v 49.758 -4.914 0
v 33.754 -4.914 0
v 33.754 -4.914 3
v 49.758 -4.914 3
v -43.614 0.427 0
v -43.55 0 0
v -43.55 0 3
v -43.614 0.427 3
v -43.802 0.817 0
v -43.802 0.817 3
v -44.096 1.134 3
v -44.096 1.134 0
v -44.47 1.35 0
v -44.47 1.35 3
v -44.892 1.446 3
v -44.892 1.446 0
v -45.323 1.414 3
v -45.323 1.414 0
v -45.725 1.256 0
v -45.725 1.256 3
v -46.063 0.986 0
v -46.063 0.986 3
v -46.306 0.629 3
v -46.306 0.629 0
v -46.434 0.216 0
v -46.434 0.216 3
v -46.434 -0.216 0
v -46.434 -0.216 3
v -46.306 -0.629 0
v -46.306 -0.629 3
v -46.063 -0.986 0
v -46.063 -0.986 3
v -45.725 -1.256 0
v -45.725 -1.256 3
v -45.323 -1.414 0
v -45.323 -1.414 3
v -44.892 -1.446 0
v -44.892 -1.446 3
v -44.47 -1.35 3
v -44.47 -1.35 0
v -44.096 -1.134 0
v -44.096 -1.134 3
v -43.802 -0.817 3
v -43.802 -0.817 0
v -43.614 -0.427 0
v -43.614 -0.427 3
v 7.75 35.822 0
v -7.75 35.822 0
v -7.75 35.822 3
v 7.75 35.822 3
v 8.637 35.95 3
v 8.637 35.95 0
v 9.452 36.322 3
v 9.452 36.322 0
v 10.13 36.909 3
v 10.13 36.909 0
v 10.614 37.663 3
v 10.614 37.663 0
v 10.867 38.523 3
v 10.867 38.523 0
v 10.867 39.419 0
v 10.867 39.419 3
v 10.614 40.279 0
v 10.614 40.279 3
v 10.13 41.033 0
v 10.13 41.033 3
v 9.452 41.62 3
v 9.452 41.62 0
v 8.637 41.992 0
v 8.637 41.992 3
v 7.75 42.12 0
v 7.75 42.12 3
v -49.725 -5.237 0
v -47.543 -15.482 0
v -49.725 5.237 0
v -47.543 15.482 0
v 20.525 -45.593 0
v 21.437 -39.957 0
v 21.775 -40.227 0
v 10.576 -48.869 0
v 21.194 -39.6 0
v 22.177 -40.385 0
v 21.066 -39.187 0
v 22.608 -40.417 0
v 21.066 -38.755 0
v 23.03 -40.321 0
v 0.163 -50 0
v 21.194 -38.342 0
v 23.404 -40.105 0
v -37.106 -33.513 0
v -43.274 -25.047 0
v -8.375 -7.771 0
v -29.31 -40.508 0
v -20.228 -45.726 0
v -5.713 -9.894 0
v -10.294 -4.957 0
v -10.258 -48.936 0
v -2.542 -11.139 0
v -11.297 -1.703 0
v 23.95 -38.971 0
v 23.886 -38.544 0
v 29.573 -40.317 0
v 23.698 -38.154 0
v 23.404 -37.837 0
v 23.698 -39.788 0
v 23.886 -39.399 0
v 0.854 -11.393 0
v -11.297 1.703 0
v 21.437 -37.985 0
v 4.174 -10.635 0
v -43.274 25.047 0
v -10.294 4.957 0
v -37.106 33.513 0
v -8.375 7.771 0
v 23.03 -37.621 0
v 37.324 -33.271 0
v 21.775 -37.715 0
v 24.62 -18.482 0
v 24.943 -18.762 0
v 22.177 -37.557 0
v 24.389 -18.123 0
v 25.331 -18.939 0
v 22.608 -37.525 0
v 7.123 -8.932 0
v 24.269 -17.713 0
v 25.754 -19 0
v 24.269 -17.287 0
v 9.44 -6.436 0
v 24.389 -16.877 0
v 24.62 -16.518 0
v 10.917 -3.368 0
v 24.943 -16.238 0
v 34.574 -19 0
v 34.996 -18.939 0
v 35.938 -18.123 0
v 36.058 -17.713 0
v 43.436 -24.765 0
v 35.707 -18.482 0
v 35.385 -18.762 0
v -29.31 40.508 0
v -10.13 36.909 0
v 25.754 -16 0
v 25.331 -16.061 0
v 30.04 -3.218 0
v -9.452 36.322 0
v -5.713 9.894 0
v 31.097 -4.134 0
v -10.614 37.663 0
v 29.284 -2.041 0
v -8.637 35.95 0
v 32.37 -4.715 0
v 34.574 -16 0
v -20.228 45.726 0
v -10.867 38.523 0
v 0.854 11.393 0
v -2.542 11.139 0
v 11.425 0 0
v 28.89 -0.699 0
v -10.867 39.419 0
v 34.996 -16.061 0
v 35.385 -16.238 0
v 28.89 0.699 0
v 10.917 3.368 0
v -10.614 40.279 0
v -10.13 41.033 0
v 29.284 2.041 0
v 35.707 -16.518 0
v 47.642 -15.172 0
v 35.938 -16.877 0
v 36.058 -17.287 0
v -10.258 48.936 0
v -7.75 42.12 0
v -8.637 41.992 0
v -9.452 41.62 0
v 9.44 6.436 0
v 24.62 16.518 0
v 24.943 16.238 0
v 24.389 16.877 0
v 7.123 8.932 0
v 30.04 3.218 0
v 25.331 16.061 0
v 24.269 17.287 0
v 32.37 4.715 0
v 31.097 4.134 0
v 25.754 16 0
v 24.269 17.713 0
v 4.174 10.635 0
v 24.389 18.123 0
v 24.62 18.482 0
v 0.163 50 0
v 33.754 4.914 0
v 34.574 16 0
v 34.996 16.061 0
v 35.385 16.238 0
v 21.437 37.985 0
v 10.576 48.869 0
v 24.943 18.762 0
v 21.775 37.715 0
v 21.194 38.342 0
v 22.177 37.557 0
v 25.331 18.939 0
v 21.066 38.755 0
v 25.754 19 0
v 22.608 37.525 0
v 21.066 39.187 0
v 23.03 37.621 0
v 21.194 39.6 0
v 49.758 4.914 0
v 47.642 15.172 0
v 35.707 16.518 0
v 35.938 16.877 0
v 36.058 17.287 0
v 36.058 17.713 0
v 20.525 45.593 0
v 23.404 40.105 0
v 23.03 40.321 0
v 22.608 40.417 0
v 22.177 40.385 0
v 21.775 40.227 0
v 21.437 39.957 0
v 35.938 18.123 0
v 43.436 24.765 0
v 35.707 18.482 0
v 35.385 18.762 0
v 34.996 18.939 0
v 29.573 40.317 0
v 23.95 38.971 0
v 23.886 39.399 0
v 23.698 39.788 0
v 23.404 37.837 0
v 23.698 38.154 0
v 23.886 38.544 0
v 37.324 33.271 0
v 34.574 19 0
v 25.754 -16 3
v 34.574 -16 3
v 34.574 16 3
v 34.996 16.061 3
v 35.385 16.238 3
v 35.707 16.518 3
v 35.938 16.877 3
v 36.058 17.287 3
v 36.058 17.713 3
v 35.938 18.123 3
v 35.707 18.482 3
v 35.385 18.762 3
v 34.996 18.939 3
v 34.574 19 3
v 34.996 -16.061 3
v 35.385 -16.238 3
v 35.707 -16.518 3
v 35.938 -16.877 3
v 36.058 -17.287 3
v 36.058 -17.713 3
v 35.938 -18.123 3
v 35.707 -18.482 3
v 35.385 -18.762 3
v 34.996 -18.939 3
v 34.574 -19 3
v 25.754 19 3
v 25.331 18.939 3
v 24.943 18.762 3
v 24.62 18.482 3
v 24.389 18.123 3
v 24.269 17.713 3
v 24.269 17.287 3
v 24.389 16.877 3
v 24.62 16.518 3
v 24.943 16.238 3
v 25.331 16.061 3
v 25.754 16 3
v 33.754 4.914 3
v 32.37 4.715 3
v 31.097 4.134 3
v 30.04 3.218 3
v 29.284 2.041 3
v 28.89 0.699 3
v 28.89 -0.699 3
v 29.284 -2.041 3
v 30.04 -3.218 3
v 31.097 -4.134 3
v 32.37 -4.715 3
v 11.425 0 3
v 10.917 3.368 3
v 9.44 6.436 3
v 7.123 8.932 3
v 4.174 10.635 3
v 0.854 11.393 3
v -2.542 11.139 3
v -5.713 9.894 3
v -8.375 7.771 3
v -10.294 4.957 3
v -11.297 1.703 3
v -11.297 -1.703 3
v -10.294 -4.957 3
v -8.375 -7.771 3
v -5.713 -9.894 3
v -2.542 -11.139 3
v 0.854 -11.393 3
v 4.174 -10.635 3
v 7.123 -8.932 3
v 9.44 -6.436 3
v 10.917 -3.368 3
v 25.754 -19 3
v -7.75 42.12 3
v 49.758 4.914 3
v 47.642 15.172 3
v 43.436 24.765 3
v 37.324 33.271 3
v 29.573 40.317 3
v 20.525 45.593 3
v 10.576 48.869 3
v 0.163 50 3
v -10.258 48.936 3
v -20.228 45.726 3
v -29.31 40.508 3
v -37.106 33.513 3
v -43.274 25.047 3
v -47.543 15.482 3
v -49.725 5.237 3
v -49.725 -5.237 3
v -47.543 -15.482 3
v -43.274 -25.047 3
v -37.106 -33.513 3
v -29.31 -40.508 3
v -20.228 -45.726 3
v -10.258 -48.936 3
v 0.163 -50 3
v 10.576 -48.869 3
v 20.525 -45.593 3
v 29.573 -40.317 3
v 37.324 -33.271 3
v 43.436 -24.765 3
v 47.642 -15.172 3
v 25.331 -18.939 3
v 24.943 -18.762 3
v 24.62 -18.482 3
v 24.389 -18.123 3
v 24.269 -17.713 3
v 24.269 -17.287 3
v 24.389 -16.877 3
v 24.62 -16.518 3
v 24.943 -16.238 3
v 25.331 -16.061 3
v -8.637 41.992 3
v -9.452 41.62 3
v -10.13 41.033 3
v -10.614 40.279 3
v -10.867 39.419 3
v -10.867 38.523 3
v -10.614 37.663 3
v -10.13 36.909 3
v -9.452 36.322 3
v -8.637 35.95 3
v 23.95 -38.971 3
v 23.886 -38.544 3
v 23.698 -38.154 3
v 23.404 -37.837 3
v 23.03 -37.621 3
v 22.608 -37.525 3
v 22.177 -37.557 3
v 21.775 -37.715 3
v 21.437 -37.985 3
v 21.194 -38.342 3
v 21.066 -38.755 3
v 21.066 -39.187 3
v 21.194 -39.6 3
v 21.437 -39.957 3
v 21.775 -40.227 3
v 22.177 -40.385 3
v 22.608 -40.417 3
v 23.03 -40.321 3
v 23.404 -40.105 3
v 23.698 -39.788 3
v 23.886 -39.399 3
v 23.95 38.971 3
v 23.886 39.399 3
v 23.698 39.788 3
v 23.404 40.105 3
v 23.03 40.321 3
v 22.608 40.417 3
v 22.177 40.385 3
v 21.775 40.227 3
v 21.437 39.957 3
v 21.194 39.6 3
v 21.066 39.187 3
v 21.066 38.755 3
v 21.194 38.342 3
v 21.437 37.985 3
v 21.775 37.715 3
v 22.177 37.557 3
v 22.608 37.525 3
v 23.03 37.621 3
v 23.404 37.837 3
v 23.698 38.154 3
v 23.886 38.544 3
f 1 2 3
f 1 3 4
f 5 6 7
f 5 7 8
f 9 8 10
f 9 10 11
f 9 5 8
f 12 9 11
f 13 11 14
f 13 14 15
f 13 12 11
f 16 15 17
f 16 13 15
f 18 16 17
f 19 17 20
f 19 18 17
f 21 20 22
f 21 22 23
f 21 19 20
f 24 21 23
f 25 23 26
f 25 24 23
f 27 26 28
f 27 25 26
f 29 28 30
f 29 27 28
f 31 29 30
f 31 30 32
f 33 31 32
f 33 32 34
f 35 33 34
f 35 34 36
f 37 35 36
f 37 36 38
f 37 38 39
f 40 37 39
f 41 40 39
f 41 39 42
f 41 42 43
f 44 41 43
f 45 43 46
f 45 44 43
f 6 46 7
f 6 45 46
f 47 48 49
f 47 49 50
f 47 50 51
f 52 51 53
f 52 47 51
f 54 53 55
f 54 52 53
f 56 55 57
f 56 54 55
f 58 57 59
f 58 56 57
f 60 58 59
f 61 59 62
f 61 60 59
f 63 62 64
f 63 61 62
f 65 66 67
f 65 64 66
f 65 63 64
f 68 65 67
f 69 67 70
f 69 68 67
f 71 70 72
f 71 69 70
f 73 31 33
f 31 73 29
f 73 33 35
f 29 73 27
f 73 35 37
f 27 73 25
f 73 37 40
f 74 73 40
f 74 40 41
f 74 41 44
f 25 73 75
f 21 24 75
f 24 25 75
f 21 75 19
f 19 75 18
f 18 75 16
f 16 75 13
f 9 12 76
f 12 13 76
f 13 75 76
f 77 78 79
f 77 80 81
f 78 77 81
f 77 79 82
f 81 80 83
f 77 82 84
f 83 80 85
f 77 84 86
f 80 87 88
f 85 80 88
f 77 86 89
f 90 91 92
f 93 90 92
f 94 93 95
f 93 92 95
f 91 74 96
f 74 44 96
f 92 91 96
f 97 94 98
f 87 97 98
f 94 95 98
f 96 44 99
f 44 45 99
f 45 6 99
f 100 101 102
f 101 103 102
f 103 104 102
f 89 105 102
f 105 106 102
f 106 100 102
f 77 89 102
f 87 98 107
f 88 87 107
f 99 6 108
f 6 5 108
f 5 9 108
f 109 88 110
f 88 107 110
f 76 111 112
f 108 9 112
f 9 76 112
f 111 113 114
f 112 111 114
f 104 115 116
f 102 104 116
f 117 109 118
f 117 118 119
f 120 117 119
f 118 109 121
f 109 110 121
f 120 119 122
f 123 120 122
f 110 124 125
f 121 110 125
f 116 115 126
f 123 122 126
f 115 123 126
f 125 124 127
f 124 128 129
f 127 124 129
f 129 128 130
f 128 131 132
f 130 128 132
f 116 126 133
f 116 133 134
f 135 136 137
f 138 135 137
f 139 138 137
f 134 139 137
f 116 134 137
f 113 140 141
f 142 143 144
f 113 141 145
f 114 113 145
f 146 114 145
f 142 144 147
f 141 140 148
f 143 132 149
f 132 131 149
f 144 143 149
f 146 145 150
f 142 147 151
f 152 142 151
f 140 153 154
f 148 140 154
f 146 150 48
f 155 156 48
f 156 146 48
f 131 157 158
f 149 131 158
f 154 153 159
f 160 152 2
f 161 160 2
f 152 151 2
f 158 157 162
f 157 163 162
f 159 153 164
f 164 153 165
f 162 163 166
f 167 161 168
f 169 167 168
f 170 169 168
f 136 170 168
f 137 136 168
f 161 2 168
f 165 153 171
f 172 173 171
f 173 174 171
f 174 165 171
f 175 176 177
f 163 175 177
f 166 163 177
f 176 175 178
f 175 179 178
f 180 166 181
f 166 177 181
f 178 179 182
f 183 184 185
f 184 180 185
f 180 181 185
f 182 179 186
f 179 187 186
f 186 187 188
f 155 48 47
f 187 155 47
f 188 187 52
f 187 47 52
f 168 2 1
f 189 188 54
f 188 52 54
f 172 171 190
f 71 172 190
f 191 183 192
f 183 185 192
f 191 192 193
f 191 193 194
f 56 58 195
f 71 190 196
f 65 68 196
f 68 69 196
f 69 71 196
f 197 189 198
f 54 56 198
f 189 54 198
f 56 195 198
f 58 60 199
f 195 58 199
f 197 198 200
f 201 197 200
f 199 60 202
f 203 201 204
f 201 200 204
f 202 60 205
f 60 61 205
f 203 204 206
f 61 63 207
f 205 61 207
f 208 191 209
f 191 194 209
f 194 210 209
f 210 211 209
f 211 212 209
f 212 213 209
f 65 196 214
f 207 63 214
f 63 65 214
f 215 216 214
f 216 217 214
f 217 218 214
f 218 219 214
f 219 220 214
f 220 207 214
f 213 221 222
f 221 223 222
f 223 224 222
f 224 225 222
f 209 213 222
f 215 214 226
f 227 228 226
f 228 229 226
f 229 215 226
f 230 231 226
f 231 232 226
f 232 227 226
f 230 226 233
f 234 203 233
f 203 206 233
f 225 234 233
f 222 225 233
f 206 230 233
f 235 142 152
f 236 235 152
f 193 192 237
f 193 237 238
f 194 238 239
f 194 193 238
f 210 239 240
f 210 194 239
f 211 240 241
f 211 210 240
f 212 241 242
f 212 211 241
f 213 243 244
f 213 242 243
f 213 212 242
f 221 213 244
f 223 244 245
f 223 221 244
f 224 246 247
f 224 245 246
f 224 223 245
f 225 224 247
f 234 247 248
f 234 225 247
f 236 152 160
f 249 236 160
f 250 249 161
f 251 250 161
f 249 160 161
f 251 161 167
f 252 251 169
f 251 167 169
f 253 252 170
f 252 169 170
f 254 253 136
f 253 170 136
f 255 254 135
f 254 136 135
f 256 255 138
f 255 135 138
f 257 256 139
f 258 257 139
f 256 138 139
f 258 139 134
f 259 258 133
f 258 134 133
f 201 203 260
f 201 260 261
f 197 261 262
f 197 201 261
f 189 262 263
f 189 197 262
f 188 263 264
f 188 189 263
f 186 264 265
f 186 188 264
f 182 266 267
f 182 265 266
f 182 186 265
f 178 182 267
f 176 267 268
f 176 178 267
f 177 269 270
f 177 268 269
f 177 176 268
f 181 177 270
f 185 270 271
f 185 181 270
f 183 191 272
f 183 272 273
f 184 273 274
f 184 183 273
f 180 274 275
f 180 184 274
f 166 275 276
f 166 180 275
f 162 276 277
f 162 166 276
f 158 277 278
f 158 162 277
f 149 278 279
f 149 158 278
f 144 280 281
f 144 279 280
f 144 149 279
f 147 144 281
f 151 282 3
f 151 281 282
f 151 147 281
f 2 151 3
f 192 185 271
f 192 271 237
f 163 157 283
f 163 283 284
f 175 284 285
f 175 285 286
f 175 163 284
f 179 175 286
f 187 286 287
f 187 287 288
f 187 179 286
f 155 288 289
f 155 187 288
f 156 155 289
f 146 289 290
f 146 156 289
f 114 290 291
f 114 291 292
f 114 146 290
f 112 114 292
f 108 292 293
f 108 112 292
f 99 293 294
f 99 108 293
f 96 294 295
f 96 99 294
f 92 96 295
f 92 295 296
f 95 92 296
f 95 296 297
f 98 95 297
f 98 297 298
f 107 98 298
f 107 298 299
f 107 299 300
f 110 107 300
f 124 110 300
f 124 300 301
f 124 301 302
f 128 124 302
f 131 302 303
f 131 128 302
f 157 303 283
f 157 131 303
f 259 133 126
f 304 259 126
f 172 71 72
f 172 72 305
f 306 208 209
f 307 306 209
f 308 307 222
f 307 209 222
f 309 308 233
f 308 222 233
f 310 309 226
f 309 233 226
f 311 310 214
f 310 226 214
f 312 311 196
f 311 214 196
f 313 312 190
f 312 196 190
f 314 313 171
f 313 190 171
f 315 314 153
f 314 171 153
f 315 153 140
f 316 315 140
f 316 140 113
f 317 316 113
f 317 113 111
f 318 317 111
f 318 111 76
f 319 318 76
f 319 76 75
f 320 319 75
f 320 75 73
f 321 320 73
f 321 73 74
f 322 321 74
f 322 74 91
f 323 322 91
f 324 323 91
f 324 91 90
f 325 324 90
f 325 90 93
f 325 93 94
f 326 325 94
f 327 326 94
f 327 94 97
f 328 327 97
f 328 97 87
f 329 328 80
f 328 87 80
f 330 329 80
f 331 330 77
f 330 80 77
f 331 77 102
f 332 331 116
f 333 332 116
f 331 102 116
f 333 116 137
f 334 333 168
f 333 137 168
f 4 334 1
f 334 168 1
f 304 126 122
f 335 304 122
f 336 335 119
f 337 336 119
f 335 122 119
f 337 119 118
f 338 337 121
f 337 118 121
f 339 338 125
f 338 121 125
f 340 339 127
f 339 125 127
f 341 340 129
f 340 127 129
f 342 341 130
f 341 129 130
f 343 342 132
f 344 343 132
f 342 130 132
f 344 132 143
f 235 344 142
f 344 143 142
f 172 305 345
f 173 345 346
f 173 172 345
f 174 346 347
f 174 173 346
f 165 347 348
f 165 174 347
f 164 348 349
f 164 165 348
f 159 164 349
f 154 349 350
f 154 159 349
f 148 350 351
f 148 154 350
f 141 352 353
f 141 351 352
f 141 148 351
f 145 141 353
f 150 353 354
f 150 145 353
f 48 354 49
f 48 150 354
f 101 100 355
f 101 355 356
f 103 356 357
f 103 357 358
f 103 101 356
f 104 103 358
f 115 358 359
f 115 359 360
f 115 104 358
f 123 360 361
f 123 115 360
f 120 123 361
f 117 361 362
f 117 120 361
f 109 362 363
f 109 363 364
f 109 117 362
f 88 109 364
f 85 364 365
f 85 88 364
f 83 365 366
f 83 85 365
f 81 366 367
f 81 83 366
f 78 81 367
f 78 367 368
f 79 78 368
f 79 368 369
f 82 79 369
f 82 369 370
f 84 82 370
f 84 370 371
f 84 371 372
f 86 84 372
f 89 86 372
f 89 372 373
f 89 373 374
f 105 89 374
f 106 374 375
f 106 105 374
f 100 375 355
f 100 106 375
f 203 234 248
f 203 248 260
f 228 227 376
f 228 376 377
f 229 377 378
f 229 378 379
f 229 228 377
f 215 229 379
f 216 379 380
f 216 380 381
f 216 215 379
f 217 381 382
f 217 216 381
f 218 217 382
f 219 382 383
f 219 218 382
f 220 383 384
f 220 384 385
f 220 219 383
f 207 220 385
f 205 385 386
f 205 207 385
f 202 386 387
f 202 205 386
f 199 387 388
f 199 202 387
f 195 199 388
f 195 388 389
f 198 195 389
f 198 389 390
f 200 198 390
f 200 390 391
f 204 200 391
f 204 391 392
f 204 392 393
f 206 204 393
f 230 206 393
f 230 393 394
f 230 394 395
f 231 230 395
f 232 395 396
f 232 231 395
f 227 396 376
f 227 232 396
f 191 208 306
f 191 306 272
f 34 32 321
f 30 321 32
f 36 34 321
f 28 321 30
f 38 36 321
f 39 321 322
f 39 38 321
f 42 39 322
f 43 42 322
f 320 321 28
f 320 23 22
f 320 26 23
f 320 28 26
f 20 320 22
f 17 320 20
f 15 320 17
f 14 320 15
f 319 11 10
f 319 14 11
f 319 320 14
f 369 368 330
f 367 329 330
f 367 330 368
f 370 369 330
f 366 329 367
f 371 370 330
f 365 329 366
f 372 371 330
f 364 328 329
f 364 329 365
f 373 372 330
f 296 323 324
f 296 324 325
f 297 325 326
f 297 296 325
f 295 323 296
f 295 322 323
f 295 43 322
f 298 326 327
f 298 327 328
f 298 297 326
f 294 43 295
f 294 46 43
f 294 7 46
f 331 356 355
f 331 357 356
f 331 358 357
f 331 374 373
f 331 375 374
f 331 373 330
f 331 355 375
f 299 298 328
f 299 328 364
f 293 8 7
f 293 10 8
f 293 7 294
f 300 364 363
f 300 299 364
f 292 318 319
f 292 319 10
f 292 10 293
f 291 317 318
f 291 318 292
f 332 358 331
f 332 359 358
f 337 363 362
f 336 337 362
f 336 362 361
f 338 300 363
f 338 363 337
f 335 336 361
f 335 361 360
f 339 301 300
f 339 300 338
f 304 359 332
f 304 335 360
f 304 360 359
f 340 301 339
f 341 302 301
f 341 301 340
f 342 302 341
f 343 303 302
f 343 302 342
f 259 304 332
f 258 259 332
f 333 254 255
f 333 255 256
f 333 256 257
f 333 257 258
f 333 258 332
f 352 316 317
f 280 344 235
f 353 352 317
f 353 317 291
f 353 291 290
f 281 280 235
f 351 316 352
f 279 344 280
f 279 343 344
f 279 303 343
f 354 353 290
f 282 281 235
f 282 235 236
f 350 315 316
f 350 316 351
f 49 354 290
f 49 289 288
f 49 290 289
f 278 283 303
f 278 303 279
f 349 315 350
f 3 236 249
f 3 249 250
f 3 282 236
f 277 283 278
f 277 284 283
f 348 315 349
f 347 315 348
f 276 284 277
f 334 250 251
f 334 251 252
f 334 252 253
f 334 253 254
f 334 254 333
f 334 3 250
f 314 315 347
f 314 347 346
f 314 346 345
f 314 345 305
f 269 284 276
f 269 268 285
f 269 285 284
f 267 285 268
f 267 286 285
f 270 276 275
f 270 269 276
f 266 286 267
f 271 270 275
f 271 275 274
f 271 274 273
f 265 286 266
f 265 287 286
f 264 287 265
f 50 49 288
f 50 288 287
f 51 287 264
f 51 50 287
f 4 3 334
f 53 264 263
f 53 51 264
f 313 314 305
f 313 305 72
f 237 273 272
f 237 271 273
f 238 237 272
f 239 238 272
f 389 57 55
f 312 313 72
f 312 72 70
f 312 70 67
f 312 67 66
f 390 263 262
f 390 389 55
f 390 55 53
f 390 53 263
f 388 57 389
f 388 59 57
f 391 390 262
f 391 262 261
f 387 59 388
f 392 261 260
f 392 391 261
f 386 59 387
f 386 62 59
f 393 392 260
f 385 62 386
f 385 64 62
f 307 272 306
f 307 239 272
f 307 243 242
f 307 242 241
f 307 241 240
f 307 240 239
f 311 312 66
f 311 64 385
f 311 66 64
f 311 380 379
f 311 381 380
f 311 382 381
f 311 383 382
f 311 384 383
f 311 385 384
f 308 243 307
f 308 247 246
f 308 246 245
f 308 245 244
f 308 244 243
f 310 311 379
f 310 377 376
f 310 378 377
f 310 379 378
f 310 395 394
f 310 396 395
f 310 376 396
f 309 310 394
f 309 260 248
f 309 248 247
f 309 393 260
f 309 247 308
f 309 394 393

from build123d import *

# Parameters (mm, degrees)
SKETCH1_R           = 50
SKETCH1_R_2         = 1.45
SKETCH1_R_3         = 11.425
BOSS_EXTRUDE1_DEPTH = 3
CUT_EXTRUDE4_REACH  = 72.774
CUT_EXTRUDE3_DEPTH  = 10


with BuildPart() as part:
    # Sketch1 → Boss-Extrude1 (new body)
    with BuildSketch(Plane.XY):
        Circle(SKETCH1_R)
        with Locations((22.5, -38.97114317)):
            Circle(SKETCH1_R_2, mode=Mode.SUBTRACT)
        with Locations((-45, 0)):
            Circle(SKETCH1_R_2, mode=Mode.SUBTRACT)
        Circle(SKETCH1_R_3, mode=Mode.SUBTRACT)
        with Locations((22.5, 38.97114317)):
            Circle(SKETCH1_R_2, mode=Mode.SUBTRACT)
    extrude(amount=BOSS_EXTRUDE1_DEPTH)

    # Sketch1_6 → Cut-Extrude4 (cut, up to next)
    with BuildSketch(Plane.XY, mode=Mode.PRIVATE) as cut_extrude4_sk1:
        with BuildLine():
            Line((7.75, 42.119988573), (-7.75, 42.119988573))
            ThreePointArc((-7.75, 42.119988573), (-10.898845402, 38.97114317), (-7.75, 35.822297768))
            Line((-7.75, 35.822297768), (7.75, 35.822297768))
            ThreePointArc((7.75, 35.822297768), (10.898845402, 38.97114317), (7.75, 42.119988573))
        make_face()
    cut_extrude4_tool1 = extrude(cut_extrude4_sk1.sketch, amount=CUT_EXTRUDE4_REACH, mode=Mode.PRIVATE) & part.part
    add(cut_extrude4_tool1.solids().sort_by_distance((0, 38.971143, 0))[0], mode=Mode.SUBTRACT)

    # Sketch2 → Cut-Extrude3 (cut)
    with BuildSketch(Plane(origin=(0, 0, 0), x_dir=(-1, 0, 0), z_dir=(0, 0, -1))):
        with BuildLine():
            Line((-50.492676186, 4.91367638), (-33.753889757, 4.91367638))
            ThreePointArc((-33.753889757, 4.91367638), (-28.840213376, 0), (-33.753889757, -4.91367638))
            Line((-33.753889757, -4.91367638), (-50.492676186, -4.91367638))
            ThreePointArc((-50.492676186, -4.91367638), (-55.406352566, 0), (-50.492676186, 4.91367638))
        make_face()
        with BuildLine():
            Line((-34.573554166, 19), (-25.753889757, 19))
            ThreePointArc((-25.753889757, 19), (-24.253889757, 17.5), (-25.753889757, 16))
            Line((-25.753889757, 16), (-34.573554166, 16))
            ThreePointArc((-34.573554166, 16), (-36.073554166, 17.5), (-34.573554166, 19))
        make_face()
        with BuildLine():
            Line((-34.573554166, -19), (-25.753889757, -19))
            ThreePointArc((-25.753889757, -19), (-24.253889757, -17.5), (-25.753889757, -16))
            Line((-25.753889757, -16), (-34.573554166, -16))
            ThreePointArc((-34.573554166, -16), (-36.073554166, -17.5), (-34.573554166, -19))
        make_face()
    extrude(amount=-CUT_EXTRUDE3_DEPTH, mode=Mode.SUBTRACT)


solid = part.part
